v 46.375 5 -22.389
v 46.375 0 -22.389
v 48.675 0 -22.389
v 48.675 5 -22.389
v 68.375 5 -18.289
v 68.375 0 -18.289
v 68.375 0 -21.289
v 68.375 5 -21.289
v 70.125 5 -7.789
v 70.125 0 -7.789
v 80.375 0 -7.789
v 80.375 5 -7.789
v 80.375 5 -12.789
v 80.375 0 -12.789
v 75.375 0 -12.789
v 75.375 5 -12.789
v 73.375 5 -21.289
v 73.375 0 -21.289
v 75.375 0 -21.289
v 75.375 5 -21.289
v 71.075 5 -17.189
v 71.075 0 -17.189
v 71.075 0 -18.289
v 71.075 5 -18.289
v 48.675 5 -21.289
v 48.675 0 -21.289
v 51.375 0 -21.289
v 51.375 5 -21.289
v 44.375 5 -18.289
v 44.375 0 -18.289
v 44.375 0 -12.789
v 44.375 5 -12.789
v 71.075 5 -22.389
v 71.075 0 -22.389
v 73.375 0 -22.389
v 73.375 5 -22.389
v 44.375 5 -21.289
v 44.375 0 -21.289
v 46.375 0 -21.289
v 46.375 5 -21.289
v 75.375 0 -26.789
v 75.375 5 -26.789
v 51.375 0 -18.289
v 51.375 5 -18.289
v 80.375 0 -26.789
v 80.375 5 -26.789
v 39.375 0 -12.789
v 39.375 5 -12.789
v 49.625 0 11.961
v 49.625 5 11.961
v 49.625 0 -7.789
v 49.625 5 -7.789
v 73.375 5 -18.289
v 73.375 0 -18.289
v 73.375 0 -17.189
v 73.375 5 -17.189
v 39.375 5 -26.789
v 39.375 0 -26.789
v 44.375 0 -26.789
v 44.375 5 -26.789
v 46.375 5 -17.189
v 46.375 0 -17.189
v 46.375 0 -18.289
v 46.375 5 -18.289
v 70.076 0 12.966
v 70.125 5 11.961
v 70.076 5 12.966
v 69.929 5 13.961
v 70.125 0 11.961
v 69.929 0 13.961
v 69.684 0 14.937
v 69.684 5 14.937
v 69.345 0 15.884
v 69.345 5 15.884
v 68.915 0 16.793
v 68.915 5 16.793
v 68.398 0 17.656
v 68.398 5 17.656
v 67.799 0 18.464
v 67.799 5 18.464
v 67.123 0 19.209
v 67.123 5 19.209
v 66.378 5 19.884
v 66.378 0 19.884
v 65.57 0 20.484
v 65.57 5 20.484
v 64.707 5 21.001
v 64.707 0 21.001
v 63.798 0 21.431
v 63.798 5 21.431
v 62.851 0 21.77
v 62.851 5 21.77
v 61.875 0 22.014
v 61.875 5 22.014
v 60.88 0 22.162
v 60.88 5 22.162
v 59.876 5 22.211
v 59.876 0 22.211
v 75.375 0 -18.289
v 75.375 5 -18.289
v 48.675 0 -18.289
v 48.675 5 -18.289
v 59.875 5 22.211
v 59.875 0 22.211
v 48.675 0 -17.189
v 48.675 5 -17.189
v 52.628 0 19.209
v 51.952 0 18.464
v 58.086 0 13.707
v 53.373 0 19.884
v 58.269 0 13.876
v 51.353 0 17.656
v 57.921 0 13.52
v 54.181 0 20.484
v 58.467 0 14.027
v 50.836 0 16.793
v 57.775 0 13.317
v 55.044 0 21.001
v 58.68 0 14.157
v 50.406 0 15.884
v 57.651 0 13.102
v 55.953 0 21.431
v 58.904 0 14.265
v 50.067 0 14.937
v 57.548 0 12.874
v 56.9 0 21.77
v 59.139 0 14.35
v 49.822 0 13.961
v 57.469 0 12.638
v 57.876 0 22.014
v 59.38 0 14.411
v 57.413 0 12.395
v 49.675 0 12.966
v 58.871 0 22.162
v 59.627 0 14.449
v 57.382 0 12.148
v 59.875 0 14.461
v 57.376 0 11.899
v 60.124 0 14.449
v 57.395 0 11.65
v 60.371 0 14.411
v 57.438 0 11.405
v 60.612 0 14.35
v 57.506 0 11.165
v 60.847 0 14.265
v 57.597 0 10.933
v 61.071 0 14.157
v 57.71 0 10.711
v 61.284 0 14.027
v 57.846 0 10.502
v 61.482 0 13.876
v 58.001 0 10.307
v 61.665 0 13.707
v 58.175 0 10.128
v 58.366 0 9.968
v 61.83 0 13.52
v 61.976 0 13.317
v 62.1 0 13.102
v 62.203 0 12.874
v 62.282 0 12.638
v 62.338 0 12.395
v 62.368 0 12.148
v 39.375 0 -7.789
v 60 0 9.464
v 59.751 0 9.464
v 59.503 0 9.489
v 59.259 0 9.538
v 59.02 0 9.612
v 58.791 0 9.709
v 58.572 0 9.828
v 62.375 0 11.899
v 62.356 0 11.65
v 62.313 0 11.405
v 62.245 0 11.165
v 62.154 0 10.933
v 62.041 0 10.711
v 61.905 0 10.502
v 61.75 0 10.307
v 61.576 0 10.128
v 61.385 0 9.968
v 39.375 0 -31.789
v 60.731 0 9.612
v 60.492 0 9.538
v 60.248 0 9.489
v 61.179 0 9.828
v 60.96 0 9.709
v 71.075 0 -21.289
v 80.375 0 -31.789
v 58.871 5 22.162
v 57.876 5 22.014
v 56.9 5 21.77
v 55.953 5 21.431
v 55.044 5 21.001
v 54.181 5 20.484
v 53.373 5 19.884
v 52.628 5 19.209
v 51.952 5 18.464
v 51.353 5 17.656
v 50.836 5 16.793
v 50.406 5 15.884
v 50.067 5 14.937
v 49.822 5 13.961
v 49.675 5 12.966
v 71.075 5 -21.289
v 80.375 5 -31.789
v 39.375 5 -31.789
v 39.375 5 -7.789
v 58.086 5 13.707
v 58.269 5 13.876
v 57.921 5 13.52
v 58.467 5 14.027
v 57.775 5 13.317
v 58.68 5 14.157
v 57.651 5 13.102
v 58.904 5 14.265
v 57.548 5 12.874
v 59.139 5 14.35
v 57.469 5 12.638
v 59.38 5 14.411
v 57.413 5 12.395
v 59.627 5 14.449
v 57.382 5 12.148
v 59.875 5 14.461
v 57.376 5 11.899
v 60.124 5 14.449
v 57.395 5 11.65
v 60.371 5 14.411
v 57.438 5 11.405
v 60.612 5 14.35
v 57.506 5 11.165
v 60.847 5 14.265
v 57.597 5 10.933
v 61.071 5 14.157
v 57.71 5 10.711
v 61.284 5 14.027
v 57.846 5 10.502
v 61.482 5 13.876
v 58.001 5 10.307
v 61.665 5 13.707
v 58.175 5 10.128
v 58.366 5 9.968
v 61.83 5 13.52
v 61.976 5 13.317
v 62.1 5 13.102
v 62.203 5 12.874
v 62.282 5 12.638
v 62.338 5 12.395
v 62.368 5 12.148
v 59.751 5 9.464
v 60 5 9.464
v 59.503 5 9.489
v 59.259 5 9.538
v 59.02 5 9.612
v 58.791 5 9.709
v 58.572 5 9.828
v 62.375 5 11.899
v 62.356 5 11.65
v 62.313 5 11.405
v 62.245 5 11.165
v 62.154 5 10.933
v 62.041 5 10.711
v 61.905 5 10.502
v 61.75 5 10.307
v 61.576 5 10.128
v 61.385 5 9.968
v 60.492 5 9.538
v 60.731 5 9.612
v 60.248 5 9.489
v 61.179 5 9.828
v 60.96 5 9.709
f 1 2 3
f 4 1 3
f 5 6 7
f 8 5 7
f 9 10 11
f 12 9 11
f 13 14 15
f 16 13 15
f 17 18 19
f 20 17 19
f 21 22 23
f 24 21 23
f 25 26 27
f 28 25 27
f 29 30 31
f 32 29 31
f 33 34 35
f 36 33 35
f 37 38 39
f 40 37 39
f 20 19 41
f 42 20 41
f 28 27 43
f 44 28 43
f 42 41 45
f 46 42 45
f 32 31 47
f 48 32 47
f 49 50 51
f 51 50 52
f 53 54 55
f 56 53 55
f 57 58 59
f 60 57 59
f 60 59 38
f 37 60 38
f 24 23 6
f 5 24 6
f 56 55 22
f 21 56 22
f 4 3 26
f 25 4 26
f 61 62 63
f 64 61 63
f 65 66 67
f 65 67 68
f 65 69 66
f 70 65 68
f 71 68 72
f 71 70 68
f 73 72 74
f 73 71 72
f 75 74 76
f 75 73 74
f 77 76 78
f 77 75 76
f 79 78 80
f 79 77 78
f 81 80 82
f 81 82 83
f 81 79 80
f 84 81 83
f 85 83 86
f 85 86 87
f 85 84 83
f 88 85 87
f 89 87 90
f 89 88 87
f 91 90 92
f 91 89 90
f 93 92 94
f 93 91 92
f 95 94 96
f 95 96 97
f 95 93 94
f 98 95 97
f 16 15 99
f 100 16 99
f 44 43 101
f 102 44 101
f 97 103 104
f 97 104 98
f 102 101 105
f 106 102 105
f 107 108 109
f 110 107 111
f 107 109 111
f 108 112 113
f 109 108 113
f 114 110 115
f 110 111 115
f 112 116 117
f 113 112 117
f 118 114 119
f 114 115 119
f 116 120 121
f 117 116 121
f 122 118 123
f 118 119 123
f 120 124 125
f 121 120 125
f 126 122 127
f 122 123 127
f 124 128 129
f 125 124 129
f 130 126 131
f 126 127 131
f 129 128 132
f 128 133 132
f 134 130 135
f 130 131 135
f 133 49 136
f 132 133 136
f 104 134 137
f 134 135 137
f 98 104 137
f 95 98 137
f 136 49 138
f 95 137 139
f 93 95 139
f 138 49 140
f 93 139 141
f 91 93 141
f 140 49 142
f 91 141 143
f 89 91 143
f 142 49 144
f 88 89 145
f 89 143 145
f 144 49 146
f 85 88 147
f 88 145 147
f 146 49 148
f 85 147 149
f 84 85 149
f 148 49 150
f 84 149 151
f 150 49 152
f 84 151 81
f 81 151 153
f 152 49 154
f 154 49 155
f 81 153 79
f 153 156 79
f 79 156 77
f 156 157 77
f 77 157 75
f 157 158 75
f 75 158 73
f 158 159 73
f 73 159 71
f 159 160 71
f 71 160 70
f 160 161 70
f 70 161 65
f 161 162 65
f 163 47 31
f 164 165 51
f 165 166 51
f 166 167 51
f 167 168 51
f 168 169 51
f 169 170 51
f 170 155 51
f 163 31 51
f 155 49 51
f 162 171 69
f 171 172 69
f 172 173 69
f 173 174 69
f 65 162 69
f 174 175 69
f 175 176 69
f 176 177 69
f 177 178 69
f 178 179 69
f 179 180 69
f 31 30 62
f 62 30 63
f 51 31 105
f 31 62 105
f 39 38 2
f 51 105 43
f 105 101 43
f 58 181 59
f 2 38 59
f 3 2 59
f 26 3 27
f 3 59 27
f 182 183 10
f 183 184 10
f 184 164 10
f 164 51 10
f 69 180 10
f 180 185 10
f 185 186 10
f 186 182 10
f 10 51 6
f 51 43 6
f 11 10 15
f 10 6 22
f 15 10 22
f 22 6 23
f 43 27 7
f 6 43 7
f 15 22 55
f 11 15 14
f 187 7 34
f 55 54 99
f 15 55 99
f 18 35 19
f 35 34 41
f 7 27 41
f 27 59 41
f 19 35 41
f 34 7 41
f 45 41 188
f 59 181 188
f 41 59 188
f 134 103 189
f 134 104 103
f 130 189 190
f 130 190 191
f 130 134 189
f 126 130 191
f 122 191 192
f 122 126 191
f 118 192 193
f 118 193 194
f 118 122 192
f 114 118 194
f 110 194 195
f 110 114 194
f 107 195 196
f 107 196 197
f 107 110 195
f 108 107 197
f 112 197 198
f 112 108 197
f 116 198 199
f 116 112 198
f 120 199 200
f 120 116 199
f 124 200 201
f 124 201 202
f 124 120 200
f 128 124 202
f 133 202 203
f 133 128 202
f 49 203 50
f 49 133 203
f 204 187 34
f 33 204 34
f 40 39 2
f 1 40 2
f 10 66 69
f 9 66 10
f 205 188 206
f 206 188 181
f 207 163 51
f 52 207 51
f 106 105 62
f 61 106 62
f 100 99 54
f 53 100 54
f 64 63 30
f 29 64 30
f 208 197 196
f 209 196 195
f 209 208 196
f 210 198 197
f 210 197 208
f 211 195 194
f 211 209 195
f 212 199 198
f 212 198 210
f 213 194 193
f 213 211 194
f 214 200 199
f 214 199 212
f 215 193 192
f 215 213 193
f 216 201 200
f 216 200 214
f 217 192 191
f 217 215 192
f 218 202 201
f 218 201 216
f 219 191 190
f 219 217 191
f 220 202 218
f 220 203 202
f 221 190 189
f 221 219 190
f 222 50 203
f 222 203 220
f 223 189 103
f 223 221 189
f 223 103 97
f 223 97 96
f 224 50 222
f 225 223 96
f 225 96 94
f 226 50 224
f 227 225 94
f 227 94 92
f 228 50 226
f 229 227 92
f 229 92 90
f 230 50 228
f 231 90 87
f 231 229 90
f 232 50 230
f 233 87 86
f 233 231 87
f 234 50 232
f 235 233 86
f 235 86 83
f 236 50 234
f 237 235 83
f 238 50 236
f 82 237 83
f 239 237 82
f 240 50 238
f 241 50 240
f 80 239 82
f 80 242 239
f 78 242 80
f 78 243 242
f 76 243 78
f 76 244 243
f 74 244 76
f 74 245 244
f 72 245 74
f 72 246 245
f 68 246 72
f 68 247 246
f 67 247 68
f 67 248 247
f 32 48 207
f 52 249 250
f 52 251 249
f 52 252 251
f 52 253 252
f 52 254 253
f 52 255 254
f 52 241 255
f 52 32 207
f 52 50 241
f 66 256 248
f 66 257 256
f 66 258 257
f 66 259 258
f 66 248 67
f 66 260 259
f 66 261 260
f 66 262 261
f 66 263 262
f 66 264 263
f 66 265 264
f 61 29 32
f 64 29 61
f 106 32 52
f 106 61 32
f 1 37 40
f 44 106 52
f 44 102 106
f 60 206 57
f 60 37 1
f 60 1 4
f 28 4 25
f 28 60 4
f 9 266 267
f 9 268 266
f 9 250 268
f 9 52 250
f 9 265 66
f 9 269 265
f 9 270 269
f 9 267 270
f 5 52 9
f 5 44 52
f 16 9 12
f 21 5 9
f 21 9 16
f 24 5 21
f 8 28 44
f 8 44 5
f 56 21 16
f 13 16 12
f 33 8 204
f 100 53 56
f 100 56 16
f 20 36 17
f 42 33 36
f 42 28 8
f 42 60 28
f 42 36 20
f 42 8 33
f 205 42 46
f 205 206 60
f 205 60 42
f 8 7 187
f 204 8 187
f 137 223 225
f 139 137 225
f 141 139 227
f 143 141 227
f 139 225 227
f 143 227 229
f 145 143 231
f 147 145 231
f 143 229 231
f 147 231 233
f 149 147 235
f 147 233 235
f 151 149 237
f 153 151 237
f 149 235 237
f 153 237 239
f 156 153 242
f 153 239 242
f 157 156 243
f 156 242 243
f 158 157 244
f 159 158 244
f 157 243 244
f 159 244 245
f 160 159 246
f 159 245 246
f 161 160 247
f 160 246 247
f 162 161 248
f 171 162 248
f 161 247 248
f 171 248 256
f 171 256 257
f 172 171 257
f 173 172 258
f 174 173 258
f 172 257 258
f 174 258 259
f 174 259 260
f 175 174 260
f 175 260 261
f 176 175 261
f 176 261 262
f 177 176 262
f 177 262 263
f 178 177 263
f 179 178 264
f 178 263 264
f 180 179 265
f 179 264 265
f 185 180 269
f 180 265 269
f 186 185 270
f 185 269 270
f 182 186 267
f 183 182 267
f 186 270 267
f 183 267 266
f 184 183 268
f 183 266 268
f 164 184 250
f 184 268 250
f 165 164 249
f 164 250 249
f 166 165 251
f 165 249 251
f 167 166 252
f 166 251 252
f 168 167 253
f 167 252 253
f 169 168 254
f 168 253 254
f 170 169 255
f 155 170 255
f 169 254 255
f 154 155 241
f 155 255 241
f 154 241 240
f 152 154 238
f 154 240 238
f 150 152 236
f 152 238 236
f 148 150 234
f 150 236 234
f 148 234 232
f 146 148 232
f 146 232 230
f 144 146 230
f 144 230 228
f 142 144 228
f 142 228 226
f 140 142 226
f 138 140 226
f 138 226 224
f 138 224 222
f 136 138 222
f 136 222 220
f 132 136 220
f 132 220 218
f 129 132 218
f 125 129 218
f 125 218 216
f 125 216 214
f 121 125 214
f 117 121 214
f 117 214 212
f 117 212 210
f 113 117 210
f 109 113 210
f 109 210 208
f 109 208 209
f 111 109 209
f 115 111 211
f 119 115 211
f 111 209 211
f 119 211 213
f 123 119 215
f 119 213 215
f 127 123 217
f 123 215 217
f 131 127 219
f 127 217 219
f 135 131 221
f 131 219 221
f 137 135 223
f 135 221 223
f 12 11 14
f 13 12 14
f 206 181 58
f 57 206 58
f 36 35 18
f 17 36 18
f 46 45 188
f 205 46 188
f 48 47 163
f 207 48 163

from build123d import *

# Parameters (mm, degrees)
BOSS_EXTRUDE1_DEPTH = 5
SKETCH2_W           = 20.5
SKETCH2_H           = 30
SKETCH2_R           = 2.5
BOSS_EXTRUDE2_DEPTH = 5
FILLET1_R           = 10.25


with BuildPart() as part:
    # Sketch1 → Boss-Extrude1 (new body)
    with BuildSketch(Plane(origin=(0, 0, 0), x_dir=(1, 0, 0), z_dir=(0, 1, 0))):
        Polygon((44.375484097, 7.788988346), (75.375484097, 7.788988346), (80.375484097, 7.788988346), (80.375484097, 12.788988346), (75.375484097, 12.788988346), (75.375484097, 18.288988346), (73.375484097, 18.288988346), (73.375484097, 17.188988346), (71.075484097, 17.188988346), (71.075484097, 18.288988346), (68.375484097, 18.288988346), (68.375484097, 21.288988346), (71.075484097, 21.288988346), (71.075484097, 22.388988346), (73.375484097, 22.388988346), (73.375484097, 21.288988346), (75.375484097, 21.288988346), (75.375484097, 26.788988346), (80.375484097, 26.788988346), (80.375484097, 31.788988346), (75.375484097, 31.788988346), (44.375484097, 31.788988346), (39.375484097, 31.788988346), (39.375484097, 26.788988346), (44.375484097, 26.788988346), (44.375484097, 21.288988346), (46.375484097, 21.288988346), (46.375484097, 22.388988346), (48.675484097, 22.388988346), (48.675484097, 21.288988346), (51.375484097, 21.288988346), (51.375484097, 18.288988346), (48.675484097, 18.288988346), (48.675484097, 17.188988346), (46.375484097, 17.188988346), (46.375484097, 18.288988346), (44.375484097, 18.288988346), (44.375484097, 12.788988346), (39.375484097, 12.788988346), (39.375484097, 7.788988346), align=None)
    extrude(amount=BOSS_EXTRUDE1_DEPTH)

    # Sketch2 → Boss-Extrude2 (add)
    with BuildSketch(Plane(origin=(0, 5, 0), x_dir=(1, 0, 0), z_dir=(0, 1, 0))):
        with Locations((59.875484097, -7.211011654)):
            Rectangle(SKETCH2_W, SKETCH2_H)
        with Locations(Location((59.875484097, -11.961011654, 0), (0, 0, 270))):
            Circle(SKETCH2_R, mode=Mode.SUBTRACT)
    extrude(amount=-BOSS_EXTRUDE2_DEPTH)

    # Fillet1
    fillet1_edges = [part.edges().sort_by_distance(p)[0] for p in [
        (49.625484097, 2.5, 22.211011654),
        (70.125484097, 2.5, 22.211011654),
    ]]
    fillet(fillet1_edges, radius=FILLET1_R - 0.0001)  # a hair under: the kernel refuses the full size


solid = part.part
